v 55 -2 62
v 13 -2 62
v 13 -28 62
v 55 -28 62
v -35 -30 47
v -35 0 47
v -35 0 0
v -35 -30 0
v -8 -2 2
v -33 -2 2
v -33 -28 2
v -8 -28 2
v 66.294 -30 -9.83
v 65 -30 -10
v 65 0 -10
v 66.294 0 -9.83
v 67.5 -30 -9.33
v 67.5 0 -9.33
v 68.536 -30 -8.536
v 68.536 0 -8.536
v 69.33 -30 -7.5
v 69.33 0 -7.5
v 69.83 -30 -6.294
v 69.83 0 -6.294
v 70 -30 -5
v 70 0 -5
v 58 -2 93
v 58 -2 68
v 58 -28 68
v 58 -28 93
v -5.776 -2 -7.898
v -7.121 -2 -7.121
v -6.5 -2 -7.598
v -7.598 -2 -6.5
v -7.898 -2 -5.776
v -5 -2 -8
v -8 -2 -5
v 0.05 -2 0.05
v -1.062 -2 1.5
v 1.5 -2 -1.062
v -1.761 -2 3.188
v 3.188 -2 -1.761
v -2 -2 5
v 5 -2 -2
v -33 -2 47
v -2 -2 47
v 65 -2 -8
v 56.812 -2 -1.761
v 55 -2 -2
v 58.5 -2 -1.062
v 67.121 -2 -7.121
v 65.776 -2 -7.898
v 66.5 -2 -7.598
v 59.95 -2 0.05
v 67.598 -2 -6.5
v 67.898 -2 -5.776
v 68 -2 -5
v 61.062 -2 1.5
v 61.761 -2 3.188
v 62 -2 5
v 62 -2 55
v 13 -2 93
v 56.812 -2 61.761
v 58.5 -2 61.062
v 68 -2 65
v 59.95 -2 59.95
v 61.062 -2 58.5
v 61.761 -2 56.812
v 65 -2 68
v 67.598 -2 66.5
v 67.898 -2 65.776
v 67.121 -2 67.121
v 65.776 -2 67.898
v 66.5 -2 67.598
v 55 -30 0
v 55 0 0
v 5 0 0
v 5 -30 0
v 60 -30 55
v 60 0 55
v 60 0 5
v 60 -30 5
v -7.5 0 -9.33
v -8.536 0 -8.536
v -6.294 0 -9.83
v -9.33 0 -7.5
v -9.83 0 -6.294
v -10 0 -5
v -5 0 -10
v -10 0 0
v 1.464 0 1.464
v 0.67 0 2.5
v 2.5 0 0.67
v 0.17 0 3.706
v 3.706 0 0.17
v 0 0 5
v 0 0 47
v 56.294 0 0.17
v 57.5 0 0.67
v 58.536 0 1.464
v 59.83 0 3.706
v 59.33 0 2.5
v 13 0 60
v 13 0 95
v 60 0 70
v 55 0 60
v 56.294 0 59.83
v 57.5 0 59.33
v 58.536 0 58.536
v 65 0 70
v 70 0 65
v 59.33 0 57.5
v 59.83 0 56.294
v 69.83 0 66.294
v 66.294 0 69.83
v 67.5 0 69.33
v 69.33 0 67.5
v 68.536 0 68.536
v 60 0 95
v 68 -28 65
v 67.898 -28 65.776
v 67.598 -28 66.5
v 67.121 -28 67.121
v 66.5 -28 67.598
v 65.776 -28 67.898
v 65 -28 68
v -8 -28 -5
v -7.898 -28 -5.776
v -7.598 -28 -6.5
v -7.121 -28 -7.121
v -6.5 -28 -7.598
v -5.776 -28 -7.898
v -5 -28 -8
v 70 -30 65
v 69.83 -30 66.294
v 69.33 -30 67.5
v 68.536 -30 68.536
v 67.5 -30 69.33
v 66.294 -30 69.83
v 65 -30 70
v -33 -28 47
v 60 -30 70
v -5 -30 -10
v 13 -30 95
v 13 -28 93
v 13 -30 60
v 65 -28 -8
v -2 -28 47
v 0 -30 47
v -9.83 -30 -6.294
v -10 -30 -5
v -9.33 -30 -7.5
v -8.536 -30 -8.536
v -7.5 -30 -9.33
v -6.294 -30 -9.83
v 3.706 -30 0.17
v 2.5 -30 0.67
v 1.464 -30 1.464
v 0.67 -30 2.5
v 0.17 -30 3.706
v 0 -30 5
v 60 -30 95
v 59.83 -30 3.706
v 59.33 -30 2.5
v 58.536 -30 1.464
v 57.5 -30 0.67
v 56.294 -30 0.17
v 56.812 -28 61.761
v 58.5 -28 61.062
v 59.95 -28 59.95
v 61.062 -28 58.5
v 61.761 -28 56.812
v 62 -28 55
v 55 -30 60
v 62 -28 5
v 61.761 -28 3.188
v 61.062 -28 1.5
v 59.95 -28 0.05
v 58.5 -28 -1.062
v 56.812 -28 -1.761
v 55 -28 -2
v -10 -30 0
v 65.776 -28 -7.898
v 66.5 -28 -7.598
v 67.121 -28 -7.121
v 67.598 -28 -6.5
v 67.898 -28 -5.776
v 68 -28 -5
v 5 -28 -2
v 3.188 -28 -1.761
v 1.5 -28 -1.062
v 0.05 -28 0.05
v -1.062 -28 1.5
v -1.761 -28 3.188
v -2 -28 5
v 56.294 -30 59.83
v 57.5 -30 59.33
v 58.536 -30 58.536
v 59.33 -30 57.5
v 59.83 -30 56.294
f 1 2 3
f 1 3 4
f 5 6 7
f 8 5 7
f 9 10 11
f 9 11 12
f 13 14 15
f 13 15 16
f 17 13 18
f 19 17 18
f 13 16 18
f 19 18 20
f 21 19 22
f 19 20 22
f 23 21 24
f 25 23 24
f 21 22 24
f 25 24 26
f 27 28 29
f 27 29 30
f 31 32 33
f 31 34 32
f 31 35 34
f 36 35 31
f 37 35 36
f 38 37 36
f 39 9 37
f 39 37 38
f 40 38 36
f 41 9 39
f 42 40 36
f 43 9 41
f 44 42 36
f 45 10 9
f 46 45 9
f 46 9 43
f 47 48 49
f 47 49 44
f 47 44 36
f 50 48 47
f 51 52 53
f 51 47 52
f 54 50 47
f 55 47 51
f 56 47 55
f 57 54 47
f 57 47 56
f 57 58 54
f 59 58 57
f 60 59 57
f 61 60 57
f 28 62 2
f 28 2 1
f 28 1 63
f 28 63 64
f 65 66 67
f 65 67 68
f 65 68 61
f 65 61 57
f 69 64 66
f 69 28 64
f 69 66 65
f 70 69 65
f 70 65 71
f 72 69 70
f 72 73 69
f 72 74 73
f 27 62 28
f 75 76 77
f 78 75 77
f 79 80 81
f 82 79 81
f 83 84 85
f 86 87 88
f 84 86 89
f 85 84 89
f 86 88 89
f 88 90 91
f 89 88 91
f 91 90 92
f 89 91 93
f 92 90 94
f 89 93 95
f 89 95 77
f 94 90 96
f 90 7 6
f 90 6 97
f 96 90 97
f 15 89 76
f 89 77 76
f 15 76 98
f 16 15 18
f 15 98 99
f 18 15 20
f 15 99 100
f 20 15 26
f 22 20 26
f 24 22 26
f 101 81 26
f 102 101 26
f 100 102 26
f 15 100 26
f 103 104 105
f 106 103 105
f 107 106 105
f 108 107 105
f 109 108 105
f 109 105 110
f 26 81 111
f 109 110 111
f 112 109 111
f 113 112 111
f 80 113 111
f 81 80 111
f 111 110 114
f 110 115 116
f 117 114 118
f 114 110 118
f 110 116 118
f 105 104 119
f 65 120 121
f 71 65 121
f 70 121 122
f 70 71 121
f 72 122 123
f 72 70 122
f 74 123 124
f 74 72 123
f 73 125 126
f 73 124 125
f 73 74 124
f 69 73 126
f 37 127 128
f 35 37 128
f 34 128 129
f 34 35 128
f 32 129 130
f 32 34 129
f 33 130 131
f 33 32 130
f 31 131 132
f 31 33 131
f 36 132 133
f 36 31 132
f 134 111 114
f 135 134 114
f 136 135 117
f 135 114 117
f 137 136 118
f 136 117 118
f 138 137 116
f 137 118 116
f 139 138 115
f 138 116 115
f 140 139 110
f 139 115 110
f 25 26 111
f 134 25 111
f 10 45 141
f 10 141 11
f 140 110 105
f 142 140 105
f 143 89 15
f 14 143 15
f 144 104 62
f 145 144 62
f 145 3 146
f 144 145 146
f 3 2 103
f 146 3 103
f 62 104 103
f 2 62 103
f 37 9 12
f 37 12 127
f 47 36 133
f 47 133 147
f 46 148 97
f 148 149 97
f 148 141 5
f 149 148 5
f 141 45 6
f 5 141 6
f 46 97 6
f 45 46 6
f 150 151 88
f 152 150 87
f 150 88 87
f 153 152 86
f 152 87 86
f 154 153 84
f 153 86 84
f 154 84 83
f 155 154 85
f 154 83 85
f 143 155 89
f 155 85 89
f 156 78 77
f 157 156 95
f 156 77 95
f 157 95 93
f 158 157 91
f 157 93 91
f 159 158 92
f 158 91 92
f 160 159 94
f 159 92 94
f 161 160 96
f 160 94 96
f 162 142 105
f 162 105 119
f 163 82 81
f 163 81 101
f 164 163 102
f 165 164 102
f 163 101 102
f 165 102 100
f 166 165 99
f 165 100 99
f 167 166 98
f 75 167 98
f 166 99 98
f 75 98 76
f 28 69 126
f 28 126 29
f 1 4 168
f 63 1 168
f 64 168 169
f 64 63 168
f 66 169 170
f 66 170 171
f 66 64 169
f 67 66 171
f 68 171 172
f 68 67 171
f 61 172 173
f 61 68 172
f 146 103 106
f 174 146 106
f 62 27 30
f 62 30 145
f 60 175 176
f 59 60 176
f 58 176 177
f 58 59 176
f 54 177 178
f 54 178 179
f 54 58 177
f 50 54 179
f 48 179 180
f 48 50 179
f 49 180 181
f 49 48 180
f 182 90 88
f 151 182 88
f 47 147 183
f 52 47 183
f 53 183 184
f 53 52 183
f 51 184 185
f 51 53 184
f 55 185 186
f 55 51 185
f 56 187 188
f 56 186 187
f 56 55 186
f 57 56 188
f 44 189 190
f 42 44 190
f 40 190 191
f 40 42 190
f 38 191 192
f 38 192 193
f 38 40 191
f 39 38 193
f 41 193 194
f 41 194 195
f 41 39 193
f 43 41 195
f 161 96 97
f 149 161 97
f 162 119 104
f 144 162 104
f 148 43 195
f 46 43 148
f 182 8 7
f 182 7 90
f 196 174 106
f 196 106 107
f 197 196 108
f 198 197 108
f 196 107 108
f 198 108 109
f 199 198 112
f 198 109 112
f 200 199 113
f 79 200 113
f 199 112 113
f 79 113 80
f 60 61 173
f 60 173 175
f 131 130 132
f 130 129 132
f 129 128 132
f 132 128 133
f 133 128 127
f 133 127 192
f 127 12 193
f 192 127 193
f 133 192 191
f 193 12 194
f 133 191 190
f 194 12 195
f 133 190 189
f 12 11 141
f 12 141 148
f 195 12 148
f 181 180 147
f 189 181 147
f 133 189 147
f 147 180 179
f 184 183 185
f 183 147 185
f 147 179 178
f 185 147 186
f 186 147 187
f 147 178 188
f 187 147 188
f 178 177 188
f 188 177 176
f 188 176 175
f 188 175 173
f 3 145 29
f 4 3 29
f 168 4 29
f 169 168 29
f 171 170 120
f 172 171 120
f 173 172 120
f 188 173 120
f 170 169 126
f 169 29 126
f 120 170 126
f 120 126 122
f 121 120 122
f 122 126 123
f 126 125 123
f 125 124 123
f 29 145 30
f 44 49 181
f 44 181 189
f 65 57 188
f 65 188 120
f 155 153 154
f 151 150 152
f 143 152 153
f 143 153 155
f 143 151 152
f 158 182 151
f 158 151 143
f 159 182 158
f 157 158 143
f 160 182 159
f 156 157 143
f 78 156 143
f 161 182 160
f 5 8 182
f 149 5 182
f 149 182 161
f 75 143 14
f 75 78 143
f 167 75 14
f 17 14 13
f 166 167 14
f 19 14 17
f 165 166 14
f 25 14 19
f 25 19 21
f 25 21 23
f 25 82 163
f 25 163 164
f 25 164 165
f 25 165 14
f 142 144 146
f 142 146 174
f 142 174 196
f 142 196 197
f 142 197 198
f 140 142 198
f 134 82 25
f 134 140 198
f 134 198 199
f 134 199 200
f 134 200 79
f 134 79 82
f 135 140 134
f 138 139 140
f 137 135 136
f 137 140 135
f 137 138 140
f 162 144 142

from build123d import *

# Parameters (mm, degrees)
F1_DEPTH = 30
F2_T     = -2
F4_W     = 31
F4_H     = 26
F5_DEPTH = 4


with BuildPart() as f1:
    # F0 (on Front) → F1 (new body)
    with BuildSketch(Plane.XZ):
        with BuildLine():
            ThreePointArc((5, 0), (1.4644660941, 1.4644660941), (0, 5))
            Line((0, 5), (0, 47))
            Line((0, 47), (-35, 47))
            Line((-35, 47), (-35, 0))
            Line((-35, 0), (-10, 0))
            Line((-10, 0), (-10, -5))
            ThreePointArc((-10, -5), (-8.5355339059, -8.5355339059), (-5, -10))
            Line((-5, -10), (65, -10))
            ThreePointArc((65, -10), (68.5355339059, -8.5355339059), (70, -5))
            Line((70, -5), (70, 65))
            ThreePointArc((70, 65), (68.5355339059, 68.5355339059), (65, 70))
            Line((65, 70), (60, 70))
            Line((60, 70), (60, 95))
            Line((60, 95), (13, 95))
            Line((13, 95), (13, 60))
            Line((13, 60), (55, 60))
            ThreePointArc((55, 60), (58.5355339059, 58.5355339059), (60, 55))
            Line((60, 55), (60, 5))
            ThreePointArc((60, 5), (58.5355339059, 1.4644660941), (55, 0))
            Line((55, 0), (5, 0))
        make_face()
    extrude(amount=F1_DEPTH)

    # F2
    f2_openings = [f1.faces().sort_by_distance(p)[0] for p in [
        (13, -15, 77.5),
    ]]
    offset(amount=F2_T, openings=f2_openings, kind=Kind.INTERSECTION)

    # F4 (on offset) → F5 (cut)
    with BuildSketch(Plane.XY.offset(47)):
        with Locations((-17.5, -15)):
            Rectangle(F4_W, F4_H)
    extrude(amount=-F5_DEPTH, mode=Mode.SUBTRACT)


solid = f1.part
